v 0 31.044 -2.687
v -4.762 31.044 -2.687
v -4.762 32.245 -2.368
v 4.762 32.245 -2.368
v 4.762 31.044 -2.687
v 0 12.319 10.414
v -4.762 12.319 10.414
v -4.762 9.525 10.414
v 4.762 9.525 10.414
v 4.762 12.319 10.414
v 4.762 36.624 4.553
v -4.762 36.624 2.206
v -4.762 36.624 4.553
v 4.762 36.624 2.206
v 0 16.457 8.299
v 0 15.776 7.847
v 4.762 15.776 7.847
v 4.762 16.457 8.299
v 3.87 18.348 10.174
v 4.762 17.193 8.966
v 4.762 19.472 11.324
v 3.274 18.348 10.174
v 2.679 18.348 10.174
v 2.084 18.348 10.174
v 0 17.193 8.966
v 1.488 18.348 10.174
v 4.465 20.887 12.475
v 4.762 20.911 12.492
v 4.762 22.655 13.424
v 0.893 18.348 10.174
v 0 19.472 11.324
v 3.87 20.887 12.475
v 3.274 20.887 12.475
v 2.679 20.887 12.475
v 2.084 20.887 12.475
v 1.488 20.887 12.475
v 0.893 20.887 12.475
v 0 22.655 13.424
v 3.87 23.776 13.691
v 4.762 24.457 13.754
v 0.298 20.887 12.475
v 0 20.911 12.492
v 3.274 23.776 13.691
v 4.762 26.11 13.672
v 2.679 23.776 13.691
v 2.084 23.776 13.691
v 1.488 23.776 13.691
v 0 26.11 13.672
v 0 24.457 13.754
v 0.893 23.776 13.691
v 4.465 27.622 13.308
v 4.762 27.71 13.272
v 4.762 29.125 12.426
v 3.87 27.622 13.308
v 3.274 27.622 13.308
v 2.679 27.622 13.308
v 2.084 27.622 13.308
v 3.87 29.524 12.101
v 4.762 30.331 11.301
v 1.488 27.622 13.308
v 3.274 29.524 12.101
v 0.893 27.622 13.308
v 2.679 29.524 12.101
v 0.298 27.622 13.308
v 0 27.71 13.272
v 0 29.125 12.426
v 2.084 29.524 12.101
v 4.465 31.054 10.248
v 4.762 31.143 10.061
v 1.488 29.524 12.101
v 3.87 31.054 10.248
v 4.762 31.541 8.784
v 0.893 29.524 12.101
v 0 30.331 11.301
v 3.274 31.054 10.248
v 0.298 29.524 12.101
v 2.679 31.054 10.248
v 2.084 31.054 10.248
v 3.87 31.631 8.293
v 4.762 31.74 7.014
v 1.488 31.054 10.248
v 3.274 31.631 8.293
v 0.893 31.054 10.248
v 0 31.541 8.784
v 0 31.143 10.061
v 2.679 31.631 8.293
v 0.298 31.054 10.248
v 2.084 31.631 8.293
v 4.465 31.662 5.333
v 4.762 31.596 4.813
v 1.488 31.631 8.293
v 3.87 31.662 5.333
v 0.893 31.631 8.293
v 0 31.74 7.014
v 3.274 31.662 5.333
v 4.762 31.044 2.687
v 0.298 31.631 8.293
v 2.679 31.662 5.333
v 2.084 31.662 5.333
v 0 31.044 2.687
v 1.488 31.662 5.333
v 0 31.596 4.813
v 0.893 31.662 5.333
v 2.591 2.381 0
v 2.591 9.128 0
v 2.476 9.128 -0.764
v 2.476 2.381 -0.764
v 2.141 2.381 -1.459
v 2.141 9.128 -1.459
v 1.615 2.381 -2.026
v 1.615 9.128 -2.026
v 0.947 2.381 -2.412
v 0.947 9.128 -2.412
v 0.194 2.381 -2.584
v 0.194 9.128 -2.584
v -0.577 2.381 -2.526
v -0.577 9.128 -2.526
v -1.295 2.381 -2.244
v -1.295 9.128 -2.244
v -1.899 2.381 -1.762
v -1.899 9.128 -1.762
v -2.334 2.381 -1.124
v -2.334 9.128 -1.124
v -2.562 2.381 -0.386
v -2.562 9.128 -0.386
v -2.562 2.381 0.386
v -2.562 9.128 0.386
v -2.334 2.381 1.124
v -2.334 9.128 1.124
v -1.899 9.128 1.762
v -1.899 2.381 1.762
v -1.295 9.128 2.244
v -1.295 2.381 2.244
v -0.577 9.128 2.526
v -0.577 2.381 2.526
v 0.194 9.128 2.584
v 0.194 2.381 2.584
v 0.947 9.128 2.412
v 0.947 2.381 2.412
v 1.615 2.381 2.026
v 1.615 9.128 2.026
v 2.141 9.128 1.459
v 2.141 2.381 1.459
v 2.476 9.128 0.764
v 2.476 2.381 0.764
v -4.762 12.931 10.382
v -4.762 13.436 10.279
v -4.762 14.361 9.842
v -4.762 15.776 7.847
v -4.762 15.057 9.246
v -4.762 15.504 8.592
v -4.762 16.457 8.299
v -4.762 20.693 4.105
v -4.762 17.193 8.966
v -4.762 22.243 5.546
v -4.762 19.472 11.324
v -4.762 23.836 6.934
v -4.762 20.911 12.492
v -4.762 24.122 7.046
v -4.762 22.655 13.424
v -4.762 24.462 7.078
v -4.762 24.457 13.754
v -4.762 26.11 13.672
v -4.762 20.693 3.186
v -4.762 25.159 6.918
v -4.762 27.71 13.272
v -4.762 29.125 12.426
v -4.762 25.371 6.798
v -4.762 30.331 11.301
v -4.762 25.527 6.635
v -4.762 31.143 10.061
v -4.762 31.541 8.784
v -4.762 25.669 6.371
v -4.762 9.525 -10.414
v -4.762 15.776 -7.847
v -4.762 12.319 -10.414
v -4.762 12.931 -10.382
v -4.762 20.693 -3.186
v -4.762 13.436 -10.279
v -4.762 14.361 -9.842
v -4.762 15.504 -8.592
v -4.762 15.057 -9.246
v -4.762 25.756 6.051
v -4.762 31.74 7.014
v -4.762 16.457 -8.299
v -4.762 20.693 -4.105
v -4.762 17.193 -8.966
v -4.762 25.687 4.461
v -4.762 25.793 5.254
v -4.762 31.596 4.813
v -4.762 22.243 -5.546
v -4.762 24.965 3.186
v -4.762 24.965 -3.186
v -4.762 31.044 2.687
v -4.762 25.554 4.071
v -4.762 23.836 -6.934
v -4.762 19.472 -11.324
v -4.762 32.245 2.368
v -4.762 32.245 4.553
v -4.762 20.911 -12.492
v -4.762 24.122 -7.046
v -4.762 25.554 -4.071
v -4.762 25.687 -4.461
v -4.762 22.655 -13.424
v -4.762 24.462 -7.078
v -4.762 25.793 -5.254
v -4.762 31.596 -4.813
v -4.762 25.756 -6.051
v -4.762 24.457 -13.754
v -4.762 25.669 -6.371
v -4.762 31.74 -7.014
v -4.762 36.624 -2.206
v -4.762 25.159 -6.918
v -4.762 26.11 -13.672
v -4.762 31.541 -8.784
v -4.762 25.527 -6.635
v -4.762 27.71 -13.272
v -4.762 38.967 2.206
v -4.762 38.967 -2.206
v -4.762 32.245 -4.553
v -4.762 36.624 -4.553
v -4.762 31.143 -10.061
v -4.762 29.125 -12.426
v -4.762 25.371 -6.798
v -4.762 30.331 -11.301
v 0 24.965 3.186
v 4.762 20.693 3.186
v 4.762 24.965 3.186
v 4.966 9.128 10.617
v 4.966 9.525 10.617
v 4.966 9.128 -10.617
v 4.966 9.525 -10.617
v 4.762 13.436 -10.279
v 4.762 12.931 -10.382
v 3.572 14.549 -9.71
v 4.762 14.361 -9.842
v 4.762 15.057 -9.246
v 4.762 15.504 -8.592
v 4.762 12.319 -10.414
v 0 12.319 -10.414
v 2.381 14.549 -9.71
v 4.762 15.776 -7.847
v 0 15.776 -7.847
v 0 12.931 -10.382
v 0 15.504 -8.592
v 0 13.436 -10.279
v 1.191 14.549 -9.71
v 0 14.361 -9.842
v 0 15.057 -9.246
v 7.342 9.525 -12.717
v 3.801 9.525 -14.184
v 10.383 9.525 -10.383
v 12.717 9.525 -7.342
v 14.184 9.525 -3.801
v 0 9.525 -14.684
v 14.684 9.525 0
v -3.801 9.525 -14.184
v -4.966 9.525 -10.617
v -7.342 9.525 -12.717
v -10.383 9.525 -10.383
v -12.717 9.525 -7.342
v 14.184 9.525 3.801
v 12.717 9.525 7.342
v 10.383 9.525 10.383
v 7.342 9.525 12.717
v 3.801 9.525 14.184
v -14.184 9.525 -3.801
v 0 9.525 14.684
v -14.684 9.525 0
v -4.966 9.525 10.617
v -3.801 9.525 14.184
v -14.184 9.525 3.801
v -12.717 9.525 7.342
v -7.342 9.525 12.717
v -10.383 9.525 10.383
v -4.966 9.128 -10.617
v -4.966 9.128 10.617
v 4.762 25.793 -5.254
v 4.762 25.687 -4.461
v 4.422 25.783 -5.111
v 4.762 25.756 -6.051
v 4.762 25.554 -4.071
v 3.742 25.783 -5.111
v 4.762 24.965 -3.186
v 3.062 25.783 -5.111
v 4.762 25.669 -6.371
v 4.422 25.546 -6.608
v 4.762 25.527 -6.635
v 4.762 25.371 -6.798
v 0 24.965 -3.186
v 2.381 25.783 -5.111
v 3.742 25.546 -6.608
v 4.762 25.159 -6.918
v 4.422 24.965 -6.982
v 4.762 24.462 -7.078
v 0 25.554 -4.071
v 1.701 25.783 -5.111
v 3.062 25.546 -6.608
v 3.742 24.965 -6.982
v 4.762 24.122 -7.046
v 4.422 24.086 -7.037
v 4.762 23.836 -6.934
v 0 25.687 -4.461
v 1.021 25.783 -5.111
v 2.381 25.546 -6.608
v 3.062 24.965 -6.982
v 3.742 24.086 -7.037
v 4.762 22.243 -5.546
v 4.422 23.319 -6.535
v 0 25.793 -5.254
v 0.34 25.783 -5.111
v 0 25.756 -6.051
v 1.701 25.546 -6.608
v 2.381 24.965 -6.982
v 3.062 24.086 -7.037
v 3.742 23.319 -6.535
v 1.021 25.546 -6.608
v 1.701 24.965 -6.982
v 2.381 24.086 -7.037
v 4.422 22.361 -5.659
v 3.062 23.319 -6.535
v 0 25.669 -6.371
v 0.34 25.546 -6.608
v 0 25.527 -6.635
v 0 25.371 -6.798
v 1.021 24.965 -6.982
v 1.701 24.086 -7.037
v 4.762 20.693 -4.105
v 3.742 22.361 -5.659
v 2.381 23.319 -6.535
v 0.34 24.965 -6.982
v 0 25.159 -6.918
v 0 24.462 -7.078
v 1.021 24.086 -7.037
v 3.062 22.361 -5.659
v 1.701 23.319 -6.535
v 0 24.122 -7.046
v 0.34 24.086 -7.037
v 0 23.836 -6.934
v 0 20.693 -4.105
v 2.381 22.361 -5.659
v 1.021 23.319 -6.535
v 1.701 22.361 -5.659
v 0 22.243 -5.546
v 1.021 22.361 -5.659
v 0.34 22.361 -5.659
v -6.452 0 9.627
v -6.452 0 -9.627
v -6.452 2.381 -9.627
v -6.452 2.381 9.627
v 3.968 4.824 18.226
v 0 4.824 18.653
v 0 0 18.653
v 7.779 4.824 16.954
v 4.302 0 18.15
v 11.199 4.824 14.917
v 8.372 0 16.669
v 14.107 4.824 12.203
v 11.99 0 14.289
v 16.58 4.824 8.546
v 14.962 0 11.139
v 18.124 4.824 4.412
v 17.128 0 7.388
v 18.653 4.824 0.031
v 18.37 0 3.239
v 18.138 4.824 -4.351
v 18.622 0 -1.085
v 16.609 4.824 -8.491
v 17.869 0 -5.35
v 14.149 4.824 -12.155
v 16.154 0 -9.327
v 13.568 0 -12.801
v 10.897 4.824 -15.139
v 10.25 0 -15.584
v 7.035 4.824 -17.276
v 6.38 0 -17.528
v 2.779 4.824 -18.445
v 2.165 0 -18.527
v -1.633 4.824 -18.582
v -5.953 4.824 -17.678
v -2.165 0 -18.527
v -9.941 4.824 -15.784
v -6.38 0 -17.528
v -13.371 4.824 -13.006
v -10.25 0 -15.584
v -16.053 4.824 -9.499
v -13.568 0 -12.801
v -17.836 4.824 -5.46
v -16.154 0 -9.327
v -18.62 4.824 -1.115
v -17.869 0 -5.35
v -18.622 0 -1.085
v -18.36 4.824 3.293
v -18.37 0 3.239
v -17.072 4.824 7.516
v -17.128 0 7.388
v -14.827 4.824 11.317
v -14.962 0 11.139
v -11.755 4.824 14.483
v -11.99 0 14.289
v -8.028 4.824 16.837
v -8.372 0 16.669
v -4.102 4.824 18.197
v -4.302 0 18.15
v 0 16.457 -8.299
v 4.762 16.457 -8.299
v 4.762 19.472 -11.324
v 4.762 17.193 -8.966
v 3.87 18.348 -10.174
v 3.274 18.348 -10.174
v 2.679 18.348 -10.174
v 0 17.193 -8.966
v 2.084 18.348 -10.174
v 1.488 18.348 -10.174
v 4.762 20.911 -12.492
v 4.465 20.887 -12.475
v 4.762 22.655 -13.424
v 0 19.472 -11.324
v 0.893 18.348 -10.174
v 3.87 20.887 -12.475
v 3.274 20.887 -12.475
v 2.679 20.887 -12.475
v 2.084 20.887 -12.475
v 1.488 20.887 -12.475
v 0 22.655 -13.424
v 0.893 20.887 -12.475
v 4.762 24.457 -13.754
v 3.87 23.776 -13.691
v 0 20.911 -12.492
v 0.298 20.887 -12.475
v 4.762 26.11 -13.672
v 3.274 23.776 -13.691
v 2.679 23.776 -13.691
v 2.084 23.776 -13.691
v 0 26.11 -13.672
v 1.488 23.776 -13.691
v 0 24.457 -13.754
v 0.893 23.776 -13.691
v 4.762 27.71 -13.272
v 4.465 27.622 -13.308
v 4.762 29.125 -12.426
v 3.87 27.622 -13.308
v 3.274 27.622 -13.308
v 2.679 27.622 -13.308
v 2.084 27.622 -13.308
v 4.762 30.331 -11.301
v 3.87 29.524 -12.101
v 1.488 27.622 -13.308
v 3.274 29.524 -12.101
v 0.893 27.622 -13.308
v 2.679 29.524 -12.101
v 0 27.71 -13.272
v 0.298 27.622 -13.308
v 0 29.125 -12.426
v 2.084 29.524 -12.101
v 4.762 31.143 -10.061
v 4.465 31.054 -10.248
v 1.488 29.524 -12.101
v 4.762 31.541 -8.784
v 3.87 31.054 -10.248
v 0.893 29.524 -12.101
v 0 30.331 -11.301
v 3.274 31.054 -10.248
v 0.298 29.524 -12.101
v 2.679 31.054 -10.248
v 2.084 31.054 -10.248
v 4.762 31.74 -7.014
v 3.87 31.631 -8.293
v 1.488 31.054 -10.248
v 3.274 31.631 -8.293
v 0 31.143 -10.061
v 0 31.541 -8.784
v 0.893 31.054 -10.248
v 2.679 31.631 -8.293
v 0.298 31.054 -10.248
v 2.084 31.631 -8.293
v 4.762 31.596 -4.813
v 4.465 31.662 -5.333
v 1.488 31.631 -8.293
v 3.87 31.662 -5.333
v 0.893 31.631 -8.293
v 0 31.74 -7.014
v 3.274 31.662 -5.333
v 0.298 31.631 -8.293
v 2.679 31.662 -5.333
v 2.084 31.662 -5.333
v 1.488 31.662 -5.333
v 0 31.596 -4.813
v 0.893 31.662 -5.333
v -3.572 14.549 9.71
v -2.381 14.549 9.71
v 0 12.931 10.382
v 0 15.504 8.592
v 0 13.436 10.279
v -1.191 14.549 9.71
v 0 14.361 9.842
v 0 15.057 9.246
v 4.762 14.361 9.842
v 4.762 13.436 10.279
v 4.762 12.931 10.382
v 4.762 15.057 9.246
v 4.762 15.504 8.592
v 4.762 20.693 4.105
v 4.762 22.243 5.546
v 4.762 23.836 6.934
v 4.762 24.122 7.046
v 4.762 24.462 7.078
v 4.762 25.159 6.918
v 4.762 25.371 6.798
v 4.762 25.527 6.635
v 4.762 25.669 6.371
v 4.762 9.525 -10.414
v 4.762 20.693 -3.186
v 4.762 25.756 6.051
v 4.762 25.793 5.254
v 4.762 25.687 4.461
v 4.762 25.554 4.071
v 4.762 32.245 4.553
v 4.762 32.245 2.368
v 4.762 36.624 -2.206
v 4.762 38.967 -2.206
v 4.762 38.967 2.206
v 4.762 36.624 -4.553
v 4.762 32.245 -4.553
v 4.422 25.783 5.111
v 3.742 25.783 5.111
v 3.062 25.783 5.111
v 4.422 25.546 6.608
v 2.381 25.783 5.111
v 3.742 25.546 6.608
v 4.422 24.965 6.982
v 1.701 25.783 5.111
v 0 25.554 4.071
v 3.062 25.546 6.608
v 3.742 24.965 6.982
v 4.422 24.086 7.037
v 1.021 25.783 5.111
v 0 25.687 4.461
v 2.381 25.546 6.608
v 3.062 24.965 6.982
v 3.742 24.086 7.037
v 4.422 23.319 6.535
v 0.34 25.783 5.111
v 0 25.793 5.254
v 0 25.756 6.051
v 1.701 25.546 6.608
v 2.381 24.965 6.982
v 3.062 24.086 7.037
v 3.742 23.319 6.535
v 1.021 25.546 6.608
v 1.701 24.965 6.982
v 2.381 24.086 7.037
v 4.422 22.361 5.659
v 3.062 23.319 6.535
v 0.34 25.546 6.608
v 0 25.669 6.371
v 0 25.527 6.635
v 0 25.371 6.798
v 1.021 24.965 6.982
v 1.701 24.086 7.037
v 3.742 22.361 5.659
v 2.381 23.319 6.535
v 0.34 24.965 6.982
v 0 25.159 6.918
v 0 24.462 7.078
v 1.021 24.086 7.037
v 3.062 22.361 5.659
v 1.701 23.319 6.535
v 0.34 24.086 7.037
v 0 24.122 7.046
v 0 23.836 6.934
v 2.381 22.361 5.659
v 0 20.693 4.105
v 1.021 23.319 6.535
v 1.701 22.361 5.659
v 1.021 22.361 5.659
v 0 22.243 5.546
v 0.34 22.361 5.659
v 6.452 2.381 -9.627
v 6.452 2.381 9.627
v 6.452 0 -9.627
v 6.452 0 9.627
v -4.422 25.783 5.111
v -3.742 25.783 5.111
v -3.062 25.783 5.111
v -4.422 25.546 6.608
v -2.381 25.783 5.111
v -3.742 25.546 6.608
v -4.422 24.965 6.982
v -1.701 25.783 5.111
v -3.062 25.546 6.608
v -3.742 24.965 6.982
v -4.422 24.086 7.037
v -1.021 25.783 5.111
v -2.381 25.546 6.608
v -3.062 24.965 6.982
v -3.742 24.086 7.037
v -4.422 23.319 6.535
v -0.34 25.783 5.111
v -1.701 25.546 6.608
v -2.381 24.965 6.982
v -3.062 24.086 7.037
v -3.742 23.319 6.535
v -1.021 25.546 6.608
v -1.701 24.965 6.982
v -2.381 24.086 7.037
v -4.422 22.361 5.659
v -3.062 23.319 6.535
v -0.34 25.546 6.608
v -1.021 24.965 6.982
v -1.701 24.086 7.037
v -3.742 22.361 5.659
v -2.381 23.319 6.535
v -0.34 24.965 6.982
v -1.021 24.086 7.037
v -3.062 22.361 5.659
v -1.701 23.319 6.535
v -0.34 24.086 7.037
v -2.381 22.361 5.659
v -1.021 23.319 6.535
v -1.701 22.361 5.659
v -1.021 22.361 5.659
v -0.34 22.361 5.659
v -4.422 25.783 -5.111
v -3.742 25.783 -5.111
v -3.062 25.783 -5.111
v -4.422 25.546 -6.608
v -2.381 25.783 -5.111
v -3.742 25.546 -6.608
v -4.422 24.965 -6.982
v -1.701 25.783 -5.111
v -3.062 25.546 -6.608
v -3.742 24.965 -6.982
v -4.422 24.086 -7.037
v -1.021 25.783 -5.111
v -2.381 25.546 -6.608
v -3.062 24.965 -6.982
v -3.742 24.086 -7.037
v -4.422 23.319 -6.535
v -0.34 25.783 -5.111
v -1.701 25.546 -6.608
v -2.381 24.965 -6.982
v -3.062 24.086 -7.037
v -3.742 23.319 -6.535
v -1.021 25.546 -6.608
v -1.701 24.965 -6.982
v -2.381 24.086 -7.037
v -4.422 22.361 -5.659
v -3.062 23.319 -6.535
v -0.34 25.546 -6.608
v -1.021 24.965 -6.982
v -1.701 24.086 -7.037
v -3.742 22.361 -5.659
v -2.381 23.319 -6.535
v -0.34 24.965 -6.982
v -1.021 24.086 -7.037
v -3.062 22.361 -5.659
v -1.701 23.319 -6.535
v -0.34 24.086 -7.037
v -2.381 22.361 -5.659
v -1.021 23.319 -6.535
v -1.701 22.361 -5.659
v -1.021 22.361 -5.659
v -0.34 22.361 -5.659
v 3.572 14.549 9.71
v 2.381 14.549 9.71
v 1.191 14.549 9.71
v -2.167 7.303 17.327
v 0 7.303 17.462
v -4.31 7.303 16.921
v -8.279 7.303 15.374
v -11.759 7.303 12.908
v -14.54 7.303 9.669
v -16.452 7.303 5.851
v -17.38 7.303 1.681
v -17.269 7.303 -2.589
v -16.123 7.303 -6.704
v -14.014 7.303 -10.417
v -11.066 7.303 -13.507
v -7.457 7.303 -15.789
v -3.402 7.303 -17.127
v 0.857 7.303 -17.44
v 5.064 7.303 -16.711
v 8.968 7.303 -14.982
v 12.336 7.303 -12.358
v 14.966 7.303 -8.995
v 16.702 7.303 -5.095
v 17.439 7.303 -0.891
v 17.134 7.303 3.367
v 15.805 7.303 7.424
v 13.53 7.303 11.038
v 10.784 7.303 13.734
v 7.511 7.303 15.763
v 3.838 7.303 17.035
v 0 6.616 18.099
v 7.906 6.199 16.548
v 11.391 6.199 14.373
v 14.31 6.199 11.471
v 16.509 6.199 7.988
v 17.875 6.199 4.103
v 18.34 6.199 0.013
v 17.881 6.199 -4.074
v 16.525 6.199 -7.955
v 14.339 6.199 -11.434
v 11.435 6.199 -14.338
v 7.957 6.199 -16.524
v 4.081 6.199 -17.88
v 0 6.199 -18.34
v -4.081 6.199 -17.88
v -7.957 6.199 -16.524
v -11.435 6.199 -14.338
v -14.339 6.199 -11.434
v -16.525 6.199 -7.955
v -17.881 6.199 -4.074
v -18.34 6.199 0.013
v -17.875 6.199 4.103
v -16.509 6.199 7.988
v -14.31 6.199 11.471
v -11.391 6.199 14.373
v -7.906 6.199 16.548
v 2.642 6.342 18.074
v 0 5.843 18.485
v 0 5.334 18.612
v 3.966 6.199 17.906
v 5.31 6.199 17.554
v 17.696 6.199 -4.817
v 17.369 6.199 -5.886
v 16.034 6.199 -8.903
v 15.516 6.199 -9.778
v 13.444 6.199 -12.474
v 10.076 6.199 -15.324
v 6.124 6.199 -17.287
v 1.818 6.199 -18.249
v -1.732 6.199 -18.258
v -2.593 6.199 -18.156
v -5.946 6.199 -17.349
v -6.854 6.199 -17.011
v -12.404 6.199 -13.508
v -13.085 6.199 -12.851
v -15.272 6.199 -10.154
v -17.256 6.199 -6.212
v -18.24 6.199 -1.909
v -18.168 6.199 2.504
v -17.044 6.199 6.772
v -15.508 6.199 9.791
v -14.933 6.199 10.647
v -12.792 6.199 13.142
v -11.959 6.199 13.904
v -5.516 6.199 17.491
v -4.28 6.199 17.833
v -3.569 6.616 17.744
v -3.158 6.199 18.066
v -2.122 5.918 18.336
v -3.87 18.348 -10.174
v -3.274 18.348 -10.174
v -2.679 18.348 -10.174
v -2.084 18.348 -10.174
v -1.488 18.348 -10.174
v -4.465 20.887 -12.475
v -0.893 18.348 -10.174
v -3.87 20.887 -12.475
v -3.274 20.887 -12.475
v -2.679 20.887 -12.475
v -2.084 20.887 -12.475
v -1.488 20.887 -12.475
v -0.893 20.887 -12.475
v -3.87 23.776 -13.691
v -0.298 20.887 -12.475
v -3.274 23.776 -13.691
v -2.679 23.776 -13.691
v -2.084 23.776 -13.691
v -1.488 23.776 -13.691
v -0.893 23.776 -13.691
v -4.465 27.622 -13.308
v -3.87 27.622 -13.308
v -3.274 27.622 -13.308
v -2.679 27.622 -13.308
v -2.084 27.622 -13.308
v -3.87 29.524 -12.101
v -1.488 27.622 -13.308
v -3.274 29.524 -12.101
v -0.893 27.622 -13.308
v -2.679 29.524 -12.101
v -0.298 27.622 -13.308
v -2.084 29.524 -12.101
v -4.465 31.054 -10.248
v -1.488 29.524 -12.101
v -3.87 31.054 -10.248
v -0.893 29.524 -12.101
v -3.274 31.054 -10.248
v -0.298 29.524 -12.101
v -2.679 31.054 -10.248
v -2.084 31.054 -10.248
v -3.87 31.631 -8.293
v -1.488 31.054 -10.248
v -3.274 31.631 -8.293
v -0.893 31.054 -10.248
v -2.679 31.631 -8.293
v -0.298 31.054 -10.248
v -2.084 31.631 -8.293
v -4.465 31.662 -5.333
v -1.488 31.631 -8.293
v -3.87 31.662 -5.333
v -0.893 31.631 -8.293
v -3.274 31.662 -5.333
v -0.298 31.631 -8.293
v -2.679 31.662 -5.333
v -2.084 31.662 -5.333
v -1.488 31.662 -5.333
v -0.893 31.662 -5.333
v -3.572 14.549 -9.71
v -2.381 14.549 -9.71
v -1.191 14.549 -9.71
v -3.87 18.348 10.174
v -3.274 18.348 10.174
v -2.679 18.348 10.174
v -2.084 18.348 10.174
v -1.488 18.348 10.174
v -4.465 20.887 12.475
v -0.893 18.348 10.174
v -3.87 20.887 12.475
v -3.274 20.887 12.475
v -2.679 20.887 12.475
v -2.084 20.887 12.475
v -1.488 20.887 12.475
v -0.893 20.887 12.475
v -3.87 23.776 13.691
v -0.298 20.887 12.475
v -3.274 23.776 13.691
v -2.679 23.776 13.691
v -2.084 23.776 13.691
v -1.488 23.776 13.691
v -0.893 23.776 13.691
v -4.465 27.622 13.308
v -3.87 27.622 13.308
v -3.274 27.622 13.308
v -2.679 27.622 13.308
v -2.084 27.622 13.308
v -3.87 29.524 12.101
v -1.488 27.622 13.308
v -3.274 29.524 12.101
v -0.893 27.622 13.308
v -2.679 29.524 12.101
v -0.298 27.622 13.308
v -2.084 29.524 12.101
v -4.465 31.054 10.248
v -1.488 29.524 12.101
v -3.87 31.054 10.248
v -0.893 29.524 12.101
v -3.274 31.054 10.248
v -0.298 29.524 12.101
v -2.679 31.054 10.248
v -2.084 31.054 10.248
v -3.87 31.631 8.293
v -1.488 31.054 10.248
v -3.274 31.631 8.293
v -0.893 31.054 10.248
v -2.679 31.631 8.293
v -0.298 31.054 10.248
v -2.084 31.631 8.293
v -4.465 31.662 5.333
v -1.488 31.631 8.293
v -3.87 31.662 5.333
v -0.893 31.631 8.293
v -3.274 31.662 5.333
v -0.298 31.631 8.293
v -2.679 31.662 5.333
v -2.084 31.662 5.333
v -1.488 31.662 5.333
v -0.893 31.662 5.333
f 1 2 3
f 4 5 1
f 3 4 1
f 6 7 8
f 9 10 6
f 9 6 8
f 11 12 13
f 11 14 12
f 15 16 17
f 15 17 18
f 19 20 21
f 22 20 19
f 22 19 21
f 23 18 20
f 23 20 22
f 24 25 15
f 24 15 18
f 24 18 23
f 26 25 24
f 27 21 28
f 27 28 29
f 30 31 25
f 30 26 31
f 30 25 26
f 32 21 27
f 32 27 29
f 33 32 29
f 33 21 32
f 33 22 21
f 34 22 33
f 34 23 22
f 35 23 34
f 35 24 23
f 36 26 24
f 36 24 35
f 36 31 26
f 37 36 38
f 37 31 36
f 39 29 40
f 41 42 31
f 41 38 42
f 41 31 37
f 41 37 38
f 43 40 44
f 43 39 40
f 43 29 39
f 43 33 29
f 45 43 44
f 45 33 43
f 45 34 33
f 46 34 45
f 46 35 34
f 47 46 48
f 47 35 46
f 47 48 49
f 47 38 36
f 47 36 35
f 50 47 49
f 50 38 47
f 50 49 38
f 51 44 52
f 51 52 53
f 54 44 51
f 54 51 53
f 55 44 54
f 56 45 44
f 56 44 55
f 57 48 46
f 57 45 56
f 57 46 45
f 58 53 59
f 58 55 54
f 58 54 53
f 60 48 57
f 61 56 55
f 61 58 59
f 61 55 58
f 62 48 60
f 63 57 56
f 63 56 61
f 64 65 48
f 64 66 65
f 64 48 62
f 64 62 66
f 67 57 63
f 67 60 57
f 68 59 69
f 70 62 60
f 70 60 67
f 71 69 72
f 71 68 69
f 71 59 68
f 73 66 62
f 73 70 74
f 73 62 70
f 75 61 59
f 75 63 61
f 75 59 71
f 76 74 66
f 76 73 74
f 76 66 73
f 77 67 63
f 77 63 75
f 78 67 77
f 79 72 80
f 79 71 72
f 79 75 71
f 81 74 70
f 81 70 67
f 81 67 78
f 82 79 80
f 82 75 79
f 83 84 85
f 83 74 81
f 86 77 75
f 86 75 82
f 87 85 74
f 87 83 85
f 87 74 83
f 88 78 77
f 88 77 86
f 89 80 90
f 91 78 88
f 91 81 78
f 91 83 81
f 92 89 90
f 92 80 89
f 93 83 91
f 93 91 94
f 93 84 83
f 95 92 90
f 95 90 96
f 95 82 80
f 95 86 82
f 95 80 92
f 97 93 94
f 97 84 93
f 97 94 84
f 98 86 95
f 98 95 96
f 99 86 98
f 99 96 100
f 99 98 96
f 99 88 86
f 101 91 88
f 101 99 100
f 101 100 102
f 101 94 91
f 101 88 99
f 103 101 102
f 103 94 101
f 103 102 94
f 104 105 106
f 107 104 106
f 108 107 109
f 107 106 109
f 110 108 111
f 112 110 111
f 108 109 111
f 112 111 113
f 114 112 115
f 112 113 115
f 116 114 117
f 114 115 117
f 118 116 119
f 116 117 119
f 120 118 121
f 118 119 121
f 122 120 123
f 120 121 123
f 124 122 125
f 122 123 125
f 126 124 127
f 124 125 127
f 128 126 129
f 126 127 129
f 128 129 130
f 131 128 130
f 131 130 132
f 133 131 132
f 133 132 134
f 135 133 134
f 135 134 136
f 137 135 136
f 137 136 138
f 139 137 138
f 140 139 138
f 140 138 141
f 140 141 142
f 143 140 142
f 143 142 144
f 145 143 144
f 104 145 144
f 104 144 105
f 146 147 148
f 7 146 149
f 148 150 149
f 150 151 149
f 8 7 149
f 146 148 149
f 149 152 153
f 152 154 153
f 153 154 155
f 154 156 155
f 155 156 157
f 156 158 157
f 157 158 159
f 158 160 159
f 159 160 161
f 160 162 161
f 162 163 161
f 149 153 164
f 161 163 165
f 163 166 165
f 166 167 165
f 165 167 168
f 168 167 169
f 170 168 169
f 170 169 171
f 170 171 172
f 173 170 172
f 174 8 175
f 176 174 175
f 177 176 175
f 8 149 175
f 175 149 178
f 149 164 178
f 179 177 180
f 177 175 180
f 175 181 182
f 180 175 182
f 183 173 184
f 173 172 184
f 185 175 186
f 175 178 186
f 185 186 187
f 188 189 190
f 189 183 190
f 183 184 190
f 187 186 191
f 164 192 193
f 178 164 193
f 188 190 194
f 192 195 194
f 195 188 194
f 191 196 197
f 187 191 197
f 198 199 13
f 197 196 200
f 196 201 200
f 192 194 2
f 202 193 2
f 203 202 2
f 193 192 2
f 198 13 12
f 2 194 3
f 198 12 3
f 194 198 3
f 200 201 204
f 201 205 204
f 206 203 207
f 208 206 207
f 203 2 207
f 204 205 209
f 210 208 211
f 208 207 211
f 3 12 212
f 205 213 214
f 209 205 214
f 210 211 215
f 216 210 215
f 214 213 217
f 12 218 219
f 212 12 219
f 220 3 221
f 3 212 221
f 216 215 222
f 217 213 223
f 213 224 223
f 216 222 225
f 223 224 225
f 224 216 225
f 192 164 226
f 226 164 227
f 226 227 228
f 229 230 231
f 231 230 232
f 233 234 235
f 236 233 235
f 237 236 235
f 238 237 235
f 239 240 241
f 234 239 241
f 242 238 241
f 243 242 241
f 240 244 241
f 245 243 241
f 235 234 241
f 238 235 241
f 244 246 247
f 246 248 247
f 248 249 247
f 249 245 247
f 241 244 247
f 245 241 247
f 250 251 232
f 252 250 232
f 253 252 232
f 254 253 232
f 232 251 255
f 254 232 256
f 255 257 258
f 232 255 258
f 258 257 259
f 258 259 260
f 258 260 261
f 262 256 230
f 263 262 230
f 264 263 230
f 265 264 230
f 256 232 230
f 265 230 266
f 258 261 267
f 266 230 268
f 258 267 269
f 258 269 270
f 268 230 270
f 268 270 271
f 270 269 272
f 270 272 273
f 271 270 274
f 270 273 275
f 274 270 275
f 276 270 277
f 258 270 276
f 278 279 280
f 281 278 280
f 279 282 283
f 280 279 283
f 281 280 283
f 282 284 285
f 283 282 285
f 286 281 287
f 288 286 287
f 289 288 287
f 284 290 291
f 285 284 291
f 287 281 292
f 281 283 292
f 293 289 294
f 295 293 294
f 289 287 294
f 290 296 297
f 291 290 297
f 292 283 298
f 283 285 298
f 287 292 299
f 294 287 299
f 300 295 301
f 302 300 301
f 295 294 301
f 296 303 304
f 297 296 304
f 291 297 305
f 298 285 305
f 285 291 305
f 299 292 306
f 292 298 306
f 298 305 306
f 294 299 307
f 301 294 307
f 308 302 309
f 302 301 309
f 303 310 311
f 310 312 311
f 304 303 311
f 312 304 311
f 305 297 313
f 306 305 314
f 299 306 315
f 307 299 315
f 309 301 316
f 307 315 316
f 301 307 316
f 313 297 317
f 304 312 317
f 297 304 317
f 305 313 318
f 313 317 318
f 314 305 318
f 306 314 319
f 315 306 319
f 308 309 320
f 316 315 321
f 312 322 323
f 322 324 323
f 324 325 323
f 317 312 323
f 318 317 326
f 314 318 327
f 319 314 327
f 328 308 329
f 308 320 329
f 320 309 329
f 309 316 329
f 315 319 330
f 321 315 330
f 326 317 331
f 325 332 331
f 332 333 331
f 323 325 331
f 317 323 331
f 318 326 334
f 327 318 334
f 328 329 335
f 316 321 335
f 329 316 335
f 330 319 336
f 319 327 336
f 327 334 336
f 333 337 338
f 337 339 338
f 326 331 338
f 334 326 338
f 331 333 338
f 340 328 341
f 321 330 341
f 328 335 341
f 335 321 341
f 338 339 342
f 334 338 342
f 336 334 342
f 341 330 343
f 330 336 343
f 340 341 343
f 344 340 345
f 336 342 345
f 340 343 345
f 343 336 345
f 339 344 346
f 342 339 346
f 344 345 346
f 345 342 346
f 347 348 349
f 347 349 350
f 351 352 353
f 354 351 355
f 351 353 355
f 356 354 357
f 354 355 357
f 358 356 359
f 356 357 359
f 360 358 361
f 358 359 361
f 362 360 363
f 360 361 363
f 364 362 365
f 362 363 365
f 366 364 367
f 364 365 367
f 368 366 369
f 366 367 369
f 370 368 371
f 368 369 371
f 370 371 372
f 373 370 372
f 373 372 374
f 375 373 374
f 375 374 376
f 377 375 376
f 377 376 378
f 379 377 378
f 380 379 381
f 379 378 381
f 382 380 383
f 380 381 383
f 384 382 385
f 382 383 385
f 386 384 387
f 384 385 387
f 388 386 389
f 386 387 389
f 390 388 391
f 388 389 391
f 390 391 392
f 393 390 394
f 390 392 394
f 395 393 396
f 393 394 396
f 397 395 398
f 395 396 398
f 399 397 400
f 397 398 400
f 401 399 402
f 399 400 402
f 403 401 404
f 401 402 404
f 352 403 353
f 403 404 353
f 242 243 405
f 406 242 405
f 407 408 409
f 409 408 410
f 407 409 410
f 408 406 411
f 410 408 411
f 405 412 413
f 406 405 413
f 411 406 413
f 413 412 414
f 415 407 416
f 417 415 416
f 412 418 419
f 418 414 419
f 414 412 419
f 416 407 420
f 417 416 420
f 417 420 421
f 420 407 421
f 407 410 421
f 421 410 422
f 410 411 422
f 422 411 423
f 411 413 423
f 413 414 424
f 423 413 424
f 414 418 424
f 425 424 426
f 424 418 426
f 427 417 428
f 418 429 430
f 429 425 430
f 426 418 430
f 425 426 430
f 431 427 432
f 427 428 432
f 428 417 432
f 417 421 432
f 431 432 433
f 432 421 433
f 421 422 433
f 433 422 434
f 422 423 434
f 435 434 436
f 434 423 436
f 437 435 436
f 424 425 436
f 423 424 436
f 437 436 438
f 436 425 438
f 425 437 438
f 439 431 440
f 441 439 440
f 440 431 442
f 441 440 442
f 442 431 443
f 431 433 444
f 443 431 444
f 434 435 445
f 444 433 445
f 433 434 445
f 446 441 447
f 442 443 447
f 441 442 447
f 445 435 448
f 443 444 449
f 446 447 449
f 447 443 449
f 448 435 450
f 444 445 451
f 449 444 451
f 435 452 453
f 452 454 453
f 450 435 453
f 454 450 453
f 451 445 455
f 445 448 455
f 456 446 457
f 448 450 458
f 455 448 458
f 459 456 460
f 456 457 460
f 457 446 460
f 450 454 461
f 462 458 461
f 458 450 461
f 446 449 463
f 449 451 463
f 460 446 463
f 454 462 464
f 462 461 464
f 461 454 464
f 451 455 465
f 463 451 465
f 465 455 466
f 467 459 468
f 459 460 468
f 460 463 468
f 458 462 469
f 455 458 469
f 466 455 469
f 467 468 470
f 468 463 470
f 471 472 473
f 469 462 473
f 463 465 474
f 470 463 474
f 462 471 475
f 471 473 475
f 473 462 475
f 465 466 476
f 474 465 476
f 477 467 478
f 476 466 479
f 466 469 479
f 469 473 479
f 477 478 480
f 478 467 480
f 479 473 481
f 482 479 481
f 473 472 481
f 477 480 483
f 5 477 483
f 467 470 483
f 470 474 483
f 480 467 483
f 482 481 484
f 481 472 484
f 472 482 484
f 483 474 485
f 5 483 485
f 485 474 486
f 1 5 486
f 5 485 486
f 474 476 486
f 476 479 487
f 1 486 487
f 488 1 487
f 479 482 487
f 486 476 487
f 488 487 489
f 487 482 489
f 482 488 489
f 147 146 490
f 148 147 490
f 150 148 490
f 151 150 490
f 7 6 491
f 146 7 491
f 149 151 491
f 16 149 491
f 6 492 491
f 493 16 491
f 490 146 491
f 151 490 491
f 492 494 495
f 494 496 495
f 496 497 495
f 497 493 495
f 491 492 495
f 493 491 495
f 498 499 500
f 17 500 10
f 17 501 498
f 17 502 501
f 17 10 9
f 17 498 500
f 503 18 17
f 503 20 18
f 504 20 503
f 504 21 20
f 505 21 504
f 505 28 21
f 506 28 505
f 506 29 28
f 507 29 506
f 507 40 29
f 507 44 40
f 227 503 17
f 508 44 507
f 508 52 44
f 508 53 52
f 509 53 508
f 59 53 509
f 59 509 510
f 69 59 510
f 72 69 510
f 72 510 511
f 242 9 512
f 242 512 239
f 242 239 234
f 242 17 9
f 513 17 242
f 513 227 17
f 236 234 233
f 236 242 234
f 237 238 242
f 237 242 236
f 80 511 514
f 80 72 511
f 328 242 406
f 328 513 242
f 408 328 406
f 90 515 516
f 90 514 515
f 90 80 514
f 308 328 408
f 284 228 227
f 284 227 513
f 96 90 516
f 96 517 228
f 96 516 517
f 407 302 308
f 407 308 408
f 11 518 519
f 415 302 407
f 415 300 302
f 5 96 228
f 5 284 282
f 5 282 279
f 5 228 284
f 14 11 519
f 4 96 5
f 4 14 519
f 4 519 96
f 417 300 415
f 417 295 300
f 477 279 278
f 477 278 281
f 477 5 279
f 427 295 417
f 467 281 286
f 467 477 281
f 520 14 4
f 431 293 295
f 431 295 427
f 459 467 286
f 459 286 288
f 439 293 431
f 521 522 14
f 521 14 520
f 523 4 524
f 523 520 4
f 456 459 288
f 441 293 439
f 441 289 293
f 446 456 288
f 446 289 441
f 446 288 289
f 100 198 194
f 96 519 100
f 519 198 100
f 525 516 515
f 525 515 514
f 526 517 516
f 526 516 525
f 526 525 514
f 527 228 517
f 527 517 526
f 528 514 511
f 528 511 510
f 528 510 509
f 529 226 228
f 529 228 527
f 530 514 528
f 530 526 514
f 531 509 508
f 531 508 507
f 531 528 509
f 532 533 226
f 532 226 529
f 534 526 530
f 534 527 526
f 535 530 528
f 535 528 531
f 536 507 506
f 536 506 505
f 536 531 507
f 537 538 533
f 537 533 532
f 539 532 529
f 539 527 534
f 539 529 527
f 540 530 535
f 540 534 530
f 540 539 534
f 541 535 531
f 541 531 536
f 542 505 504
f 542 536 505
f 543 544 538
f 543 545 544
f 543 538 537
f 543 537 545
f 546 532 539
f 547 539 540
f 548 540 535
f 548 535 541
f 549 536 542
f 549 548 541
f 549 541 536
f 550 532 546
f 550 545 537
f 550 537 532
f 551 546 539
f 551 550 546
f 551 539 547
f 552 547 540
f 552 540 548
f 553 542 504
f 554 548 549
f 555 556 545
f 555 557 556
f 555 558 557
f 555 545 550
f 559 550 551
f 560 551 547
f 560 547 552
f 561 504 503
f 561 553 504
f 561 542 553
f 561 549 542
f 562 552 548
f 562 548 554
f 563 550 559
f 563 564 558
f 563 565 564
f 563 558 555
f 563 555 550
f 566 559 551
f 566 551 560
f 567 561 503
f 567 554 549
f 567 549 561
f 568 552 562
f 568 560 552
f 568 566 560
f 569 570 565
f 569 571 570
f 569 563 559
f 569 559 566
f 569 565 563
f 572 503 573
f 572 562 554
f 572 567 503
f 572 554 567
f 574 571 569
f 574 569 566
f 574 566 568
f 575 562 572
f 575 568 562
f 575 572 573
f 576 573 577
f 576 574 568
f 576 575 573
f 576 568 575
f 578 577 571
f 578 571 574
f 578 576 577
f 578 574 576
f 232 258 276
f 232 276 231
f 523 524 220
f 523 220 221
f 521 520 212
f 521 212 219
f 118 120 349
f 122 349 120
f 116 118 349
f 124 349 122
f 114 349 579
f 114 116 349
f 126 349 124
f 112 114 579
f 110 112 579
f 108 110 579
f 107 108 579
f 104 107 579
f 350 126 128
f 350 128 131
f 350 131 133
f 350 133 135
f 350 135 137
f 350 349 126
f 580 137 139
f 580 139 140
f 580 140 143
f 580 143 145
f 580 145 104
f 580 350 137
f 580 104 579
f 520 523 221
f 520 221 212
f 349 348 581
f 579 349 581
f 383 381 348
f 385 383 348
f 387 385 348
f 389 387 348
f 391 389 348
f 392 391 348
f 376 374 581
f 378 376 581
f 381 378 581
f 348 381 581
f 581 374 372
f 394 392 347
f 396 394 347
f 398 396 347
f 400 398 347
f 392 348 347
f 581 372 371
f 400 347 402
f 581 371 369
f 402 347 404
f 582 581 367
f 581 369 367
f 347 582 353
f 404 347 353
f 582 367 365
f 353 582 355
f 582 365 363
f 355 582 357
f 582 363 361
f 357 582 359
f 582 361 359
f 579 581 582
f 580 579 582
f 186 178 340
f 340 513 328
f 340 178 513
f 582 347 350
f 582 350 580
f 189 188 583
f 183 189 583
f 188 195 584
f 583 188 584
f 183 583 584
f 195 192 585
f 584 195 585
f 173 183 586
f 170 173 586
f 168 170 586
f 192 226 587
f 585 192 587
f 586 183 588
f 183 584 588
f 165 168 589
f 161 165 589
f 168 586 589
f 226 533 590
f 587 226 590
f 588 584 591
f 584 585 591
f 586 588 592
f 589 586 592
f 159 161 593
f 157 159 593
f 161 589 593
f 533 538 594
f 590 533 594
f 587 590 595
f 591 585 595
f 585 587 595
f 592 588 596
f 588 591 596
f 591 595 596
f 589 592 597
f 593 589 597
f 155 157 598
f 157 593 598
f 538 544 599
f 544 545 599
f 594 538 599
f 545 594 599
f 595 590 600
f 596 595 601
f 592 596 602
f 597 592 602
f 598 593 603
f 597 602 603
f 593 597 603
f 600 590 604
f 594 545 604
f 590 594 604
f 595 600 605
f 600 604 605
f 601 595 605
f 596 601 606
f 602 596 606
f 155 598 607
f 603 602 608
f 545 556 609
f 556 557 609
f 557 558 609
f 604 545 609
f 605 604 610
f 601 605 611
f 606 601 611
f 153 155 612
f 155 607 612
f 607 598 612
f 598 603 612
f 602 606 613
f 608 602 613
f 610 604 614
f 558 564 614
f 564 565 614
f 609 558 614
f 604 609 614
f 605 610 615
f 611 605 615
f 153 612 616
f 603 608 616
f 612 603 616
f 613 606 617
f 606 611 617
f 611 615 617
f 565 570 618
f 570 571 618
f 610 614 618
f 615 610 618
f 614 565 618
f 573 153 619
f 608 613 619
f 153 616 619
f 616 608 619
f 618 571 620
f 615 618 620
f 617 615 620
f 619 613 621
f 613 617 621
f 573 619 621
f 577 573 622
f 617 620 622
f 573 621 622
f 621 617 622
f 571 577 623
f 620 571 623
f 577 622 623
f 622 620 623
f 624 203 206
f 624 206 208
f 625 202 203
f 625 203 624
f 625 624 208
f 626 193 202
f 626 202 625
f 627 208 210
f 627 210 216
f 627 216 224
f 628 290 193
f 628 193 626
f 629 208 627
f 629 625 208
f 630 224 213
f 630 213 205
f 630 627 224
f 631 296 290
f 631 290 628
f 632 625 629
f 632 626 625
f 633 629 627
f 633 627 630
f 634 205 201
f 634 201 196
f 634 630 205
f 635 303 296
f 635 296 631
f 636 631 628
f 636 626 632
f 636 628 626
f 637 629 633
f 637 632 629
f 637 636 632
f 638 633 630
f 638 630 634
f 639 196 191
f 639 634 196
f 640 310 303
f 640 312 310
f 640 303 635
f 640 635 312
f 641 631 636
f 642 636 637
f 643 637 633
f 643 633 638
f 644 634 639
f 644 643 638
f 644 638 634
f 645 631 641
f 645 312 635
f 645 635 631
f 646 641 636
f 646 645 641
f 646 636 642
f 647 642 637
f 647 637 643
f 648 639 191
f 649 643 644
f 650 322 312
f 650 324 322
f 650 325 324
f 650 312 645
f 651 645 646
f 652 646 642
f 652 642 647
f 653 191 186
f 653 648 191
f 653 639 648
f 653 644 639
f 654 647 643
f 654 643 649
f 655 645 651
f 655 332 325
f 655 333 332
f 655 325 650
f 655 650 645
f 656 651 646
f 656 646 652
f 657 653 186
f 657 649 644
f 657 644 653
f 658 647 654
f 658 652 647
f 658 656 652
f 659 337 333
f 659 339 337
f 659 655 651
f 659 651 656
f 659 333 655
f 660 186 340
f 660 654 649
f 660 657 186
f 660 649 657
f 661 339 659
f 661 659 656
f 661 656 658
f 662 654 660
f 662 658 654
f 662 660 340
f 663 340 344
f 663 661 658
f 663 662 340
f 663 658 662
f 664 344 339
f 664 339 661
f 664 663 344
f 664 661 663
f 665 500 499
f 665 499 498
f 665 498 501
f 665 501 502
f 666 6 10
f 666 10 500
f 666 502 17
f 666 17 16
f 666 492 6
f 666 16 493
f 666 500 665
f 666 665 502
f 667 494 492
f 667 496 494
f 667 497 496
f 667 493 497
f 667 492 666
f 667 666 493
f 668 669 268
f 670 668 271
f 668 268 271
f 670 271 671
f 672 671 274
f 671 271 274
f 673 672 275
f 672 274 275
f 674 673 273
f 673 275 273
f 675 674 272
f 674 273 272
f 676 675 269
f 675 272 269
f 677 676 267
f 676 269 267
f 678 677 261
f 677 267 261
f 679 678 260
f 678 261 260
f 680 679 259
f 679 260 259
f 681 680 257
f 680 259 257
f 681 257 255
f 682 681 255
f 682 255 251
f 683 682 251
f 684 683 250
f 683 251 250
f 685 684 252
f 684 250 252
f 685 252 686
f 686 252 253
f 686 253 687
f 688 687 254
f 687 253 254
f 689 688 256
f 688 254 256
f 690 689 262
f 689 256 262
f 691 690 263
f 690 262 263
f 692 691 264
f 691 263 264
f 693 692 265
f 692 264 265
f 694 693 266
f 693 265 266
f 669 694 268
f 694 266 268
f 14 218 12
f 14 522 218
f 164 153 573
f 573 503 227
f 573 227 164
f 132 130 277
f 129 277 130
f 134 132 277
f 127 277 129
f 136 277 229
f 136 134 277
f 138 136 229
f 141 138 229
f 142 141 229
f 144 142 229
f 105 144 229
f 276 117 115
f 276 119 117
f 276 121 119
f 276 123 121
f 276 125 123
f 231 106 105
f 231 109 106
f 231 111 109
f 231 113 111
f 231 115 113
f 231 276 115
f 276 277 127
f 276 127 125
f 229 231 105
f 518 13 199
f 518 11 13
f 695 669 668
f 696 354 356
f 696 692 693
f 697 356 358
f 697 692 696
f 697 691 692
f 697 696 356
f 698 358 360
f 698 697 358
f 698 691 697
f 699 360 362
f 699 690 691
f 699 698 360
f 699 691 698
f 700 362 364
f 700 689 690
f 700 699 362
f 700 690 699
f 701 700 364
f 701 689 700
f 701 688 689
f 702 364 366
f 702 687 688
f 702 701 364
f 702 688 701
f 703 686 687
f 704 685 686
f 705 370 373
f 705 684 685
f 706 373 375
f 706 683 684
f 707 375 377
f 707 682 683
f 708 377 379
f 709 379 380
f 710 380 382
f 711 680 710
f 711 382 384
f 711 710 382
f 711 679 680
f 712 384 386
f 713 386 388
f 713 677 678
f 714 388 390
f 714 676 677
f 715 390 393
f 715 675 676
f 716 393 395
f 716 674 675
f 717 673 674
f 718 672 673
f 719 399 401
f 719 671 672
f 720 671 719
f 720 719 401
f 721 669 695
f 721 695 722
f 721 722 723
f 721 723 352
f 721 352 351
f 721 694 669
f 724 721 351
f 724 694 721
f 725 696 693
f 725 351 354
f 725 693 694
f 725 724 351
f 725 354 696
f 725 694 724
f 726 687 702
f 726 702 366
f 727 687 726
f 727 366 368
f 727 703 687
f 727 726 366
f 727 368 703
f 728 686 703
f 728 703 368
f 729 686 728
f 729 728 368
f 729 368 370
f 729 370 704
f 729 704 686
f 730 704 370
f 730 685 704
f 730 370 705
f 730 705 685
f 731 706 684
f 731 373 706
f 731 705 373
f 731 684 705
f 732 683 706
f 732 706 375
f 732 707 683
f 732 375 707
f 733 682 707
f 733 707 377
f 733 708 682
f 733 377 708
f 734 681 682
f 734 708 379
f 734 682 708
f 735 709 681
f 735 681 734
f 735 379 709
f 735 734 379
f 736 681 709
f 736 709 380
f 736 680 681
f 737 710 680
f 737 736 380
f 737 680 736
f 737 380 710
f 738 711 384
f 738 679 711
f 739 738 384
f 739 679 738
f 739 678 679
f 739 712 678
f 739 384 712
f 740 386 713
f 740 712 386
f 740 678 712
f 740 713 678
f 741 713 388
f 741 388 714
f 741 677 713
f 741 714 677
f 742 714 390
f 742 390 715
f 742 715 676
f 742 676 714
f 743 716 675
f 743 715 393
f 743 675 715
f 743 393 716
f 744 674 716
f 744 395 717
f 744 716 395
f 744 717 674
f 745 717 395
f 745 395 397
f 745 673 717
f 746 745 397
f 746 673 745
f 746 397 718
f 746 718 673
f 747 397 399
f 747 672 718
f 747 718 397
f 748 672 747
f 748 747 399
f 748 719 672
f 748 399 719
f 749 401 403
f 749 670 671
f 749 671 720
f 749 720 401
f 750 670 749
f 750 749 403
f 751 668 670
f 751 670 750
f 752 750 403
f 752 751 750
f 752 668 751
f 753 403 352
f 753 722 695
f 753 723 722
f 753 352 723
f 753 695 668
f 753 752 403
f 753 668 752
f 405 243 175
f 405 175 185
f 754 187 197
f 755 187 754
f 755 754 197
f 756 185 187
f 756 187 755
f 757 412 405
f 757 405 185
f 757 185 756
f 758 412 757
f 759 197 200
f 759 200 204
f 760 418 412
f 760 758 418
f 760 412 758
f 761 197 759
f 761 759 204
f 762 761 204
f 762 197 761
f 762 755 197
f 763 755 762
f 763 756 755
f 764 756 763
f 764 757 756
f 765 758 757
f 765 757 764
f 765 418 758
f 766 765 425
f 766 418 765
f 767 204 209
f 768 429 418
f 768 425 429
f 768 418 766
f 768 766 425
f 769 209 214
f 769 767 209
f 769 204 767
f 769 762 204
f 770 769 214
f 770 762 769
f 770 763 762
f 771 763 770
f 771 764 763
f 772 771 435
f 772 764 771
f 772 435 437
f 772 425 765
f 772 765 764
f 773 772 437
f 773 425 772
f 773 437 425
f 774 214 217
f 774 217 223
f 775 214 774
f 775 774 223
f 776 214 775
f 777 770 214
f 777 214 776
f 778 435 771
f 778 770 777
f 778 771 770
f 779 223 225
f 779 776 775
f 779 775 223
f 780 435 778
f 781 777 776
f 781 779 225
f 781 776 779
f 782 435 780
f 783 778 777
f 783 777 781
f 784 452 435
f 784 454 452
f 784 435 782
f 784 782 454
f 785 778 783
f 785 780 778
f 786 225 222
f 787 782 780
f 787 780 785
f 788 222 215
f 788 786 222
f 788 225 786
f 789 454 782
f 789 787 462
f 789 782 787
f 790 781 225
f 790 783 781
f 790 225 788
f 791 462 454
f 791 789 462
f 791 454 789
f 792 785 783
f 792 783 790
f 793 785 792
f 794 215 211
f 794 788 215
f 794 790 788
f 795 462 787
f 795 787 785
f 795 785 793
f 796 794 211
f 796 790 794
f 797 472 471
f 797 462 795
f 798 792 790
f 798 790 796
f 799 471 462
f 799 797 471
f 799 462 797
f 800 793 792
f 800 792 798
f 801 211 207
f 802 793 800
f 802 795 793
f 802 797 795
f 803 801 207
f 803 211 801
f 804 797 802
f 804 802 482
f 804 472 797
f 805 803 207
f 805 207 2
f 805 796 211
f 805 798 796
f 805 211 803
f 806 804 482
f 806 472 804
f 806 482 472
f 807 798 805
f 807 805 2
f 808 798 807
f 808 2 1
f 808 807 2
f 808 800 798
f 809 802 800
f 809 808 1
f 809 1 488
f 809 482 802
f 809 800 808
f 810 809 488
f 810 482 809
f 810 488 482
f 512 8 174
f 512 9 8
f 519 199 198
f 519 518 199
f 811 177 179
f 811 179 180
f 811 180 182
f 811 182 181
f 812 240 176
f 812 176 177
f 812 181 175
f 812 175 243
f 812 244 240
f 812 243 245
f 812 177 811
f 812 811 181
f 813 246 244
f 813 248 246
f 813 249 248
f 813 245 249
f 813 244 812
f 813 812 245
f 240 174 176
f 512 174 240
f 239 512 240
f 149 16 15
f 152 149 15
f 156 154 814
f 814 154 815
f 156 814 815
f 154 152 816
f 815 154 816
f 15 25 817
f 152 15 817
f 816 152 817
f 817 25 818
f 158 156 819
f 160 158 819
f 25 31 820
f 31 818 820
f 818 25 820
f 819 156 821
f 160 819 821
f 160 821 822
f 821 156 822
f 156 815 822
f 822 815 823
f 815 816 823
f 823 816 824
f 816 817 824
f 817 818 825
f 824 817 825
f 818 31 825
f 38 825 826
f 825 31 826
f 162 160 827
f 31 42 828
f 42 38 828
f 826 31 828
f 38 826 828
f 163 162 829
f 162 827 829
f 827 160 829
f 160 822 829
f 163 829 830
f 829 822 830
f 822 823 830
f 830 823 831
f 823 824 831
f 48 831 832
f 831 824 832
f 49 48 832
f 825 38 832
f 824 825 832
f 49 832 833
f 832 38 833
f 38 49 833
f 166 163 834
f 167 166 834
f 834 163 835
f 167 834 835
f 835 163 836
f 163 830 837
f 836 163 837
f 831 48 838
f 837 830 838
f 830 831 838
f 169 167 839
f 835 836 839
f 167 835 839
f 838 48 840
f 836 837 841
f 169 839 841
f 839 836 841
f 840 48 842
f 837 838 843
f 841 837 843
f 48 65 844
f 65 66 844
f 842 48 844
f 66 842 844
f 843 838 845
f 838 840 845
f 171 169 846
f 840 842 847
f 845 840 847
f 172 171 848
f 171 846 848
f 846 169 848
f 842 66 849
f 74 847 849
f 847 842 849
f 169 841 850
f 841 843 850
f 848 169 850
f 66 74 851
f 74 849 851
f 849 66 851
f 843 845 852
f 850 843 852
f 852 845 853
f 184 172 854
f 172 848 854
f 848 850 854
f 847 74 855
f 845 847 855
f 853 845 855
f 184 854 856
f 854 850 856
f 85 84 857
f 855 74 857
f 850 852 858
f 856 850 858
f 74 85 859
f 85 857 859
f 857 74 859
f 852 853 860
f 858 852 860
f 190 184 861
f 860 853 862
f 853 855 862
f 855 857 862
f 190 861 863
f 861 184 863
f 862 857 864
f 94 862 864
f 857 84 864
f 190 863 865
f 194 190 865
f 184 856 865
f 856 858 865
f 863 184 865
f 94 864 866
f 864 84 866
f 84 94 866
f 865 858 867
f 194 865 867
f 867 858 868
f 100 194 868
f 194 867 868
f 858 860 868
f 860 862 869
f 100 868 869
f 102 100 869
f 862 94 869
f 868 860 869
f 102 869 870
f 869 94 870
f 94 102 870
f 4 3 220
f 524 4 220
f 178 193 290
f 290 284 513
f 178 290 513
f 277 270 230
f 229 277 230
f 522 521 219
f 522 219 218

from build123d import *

# Parameters (mm, degrees)
SKETCH1_R                  = 18.653125
BOSS_EXTRUDE1_DEPTH        = 6.35
FILLET1_R                  = 3.175
SKETCH3_W                  = 12.9032
SKETCH3_H                  = 19.2532
CUT_EXTRUDE1_DEPTH         = 2.38125
F_6_0_204_DIAMETER_HOLE1_D = 5.1816
BOSS_EXTRUDE2_DEPTH        = 4.7625
SKETCH7_W                  = 9.9314
SKETCH7_H                  = 21.2344
CUT_EXTRUDE2_DEPTH         = 0.396875


with BuildPart() as part:
    # Sketch1 → Boss-Extrude1 (new body)
    with BuildSketch(Plane(origin=(0, 0, 0), x_dir=(1, 0, 0), z_dir=(0, 1, 0))):
        with Locations(Location((0, 0, 0), (0, 0, 270))):
            Circle(SKETCH1_R)
    extrude(amount=BOSS_EXTRUDE1_DEPTH)

    # Sketch2 → Revolve1 (revolve)
    with BuildSketch(Plane.XY, mode=Mode.PRIVATE) as revolve1_sk:
        Polygon((-18.653125, 6.35), (-14.684375, 9.525), (0, 9.525), (0, 6.35), align=None)
    revolve(revolve1_sk.sketch.rotate(Axis((0, 9.525, 0), (0, -1, 0)), 270), axis=Axis((0, 9.525, 0), (0, -1, 0)))

    # Fillet1
    fillet1_edges = [part.edges().sort_by_distance(p)[0] for p in [
        (0, 6.35, -18.653125),
    ]]
    fillet(fillet1_edges, radius=FILLET1_R)

    # Sketch3 → Cut-Extrude1 (cut, symmetric)
    with BuildSketch(Plane.XZ):
        Rectangle(SKETCH3_W, SKETCH3_H)
    extrude(amount=CUT_EXTRUDE1_DEPTH, both=True, mode=Mode.SUBTRACT)

    # #6 (0.204) Diameter Hole1 (through all)
    with Locations(Plane(origin=(0, 2.38125, 0), x_dir=(-1, 0, 0), z_dir=(0, -1, 0))):
        with Locations((0, 0)):
            Hole(F_6_0_204_DIAMETER_HOLE1_D / 2)

    # Sketch7 → Cut-Extrude2 (cut)
    with BuildSketch(Plane(origin=(0, 9.525, 0), x_dir=(1, 0, 0), z_dir=(0, 1, 0))):
        Rectangle(SKETCH7_W, SKETCH7_H)
    extrude(amount=-CUT_EXTRUDE2_DEPTH, mode=Mode.SUBTRACT)


with BuildPart() as body_2:
    # Sketch6 → Boss-Extrude2 (new, symmetric)
    with BuildSketch(Plane(origin=(0, 0, 0), x_dir=(0, 0, -1), z_dir=(1, 0, 0))):
        with BuildLine():
            Line((-10.414, 9.525), (10.414, 9.525))
            Line((10.414, 9.525), (10.414, 12.319))
            add(Edge.make_bspline(
                [(10.414, 12.319), (10.414, 12.625287573), (10.371667369, 13.406964275), (9.885757454, 14.402839912), (9.028588556, 15.323260467), (8.323227211, 15.667269394), (7.846654217, 15.775823925)],
                knots=[0, 0, 0, 0, 0.191943751, 0.510715935, 0.68389574, 1, 1, 1, 1], degree=3))
            add(Edge.make_bspline(
                [(7.846654217, 15.775823925), (8.205033548, 16.4445123), (9.030173215, 17.270097895), (10.367300223, 18.531439576), (11.506441863, 19.600593274), (12.554618766, 20.952853725), (13.356720714, 22.257928697), (13.814116346, 24.043872705), (13.759942749, 25.845069503), (13.434492623, 27.468424658), (12.823485642, 28.607913269), (12.132904298, 29.528328448), (11.278159238, 30.398102844), (10.294793743, 31.09598337), (9.251297565, 31.450042035), (7.615915473, 31.783134316), (5.396677236, 31.758505405), (3.535577292, 31.383938111), (2.687389519, 31.043818914)],
                knots=[0, 0, 0, 0, 0.085093592, 0.132048037, 0.20946627, 0.262245482, 0.326558193, 0.382120585, 0.469326689, 0.529647412, 0.568484945, 0.615345474, 0.660219557, 0.70691091, 0.750975595, 0.784442114, 0.896708947, 1, 1, 1, 1], degree=3))
            Line((2.687389519, 31.043818914), (2.367713572, 32.24494658))
            Line((2.367713572, 32.24494658), (4.552516721, 32.24494658))
            Line((4.552516721, 32.24494658), (4.552516721, 36.623942991))
            Line((4.552516721, 36.623942991), (2.206165697, 36.623942991))
            Line((2.206165697, 36.623942991), (2.206165697, 38.967448341))
            Line((2.206165697, 38.967448341), (-2.206165697, 38.967448341))
            Line((-2.206165697, 38.967448341), (-2.206165697, 36.623942991))
            Line((-2.206165697, 36.623942991), (-4.552516721, 36.623942991))
            Line((-4.552516721, 36.623942991), (-4.552516721, 32.24494658))
            Line((-4.552516721, 32.24494658), (-2.367713572, 32.24494658))
            Line((-2.367713572, 32.24494658), (-2.687389519, 31.043818914))
            add(Edge.make_bspline(
                [(-7.846654217, 15.775823925), (-8.205033548, 16.4445123), (-9.030173215, 17.270097895), (-10.367300223, 18.531439576), (-11.506441863, 19.600593274), (-12.554618766, 20.952853725), (-13.356720714, 22.257928697), (-13.814116346, 24.043872705), (-13.759942749, 25.845069503), (-13.434492623, 27.468424658), (-12.823485642, 28.607913269), (-12.132904298, 29.528328448), (-11.278159238, 30.398102844), (-10.294793743, 31.09598337), (-9.251297565, 31.450042035), (-7.615915473, 31.783134316), (-5.396677236, 31.758505405), (-3.535577292, 31.383938111), (-2.687389519, 31.043818914)],
                knots=[0, 0, 0, 0, 0.085093592, 0.132048037, 0.20946627, 0.262245482, 0.326558193, 0.382120585, 0.469326689, 0.529647412, 0.568484945, 0.615345474, 0.660219557, 0.70691091, 0.750975595, 0.784442114, 0.896708947, 1, 1, 1, 1], degree=3))
            add(Edge.make_bspline(
                [(-10.414, 12.319), (-10.414, 12.625287573), (-10.371667369, 13.406964275), (-9.885757454, 14.402839912), (-9.028588556, 15.323260467), (-8.323227211, 15.667269394), (-7.846654217, 15.775823925)],
                knots=[0, 0, 0, 0, 0.191943751, 0.510715935, 0.68389574, 1, 1, 1, 1], degree=3))
            Line((-10.414, 12.319), (-10.414, 9.525))
        make_face()
        with BuildLine():
            Line((-3.186264633, 20.693260232), (-3.186264633, 24.964857672))
            add(Edge.make_bspline(
                [(-3.186264633, 24.964857672), (-3.496110079, 25.231215789), (-4.098640049, 25.660720042), (-5.142701618, 25.805824845), (-5.956644147, 25.815984428), (-6.561200449, 25.616012815), (-6.872026059, 25.316200381), (-6.993972235, 24.942819361), (-7.09597015, 24.531556258), (-7.069224778, 24.111586077), (-6.875274819, 23.69358972), (-6.55034022, 23.331807132), (-6.118995079, 22.877220224), (-5.693998337, 22.383971695), (-4.967740692, 21.669579588), (-4.459164569, 21.104071975), (-4.104813592, 20.693260232)],
                knots=[0, 0, 0, 0, 0.127028133, 0.218333624, 0.319362177, 0.37560628, 0.408656755, 0.447791719, 0.493913348, 0.538939693, 0.57359785, 0.633524, 0.687102481, 0.766504718, 0.833287283, 1, 1, 1, 1], degree=3))
            Line((-4.104813592, 20.693260232), (-3.186264633, 20.693260232))
        make_face(mode=Mode.SUBTRACT)
        with BuildLine():
            Line((3.186264633, 20.693260232), (4.104813592, 20.693260232))
            add(Edge.make_bspline(
                [(3.186264633, 24.964857672), (3.496110079, 25.231215789), (4.098640049, 25.660720042), (5.142701618, 25.805824845), (5.956644147, 25.815984428), (6.561200449, 25.616012815), (6.872026059, 25.316200381), (6.993972235, 24.942819361), (7.09597015, 24.531556258), (7.069224778, 24.111586077), (6.875274819, 23.69358972), (6.55034022, 23.331807132), (6.118995079, 22.877220224), (5.693998337, 22.383971695), (4.967740692, 21.669579588), (4.459164569, 21.104071975), (4.104813592, 20.693260232)],
                knots=[0, 0, 0, 0, 0.127028133, 0.218333624, 0.319362177, 0.37560628, 0.408656755, 0.447791719, 0.493913348, 0.538939693, 0.57359785, 0.633524, 0.687102481, 0.766504718, 0.833287283, 1, 1, 1, 1], degree=3))
            Line((3.186264633, 24.964857672), (3.186264633, 20.693260232))
        make_face(mode=Mode.SUBTRACT)
    extrude(amount=BOSS_EXTRUDE2_DEPTH, both=True)


solid = Compound([part.part, body_2.part])
